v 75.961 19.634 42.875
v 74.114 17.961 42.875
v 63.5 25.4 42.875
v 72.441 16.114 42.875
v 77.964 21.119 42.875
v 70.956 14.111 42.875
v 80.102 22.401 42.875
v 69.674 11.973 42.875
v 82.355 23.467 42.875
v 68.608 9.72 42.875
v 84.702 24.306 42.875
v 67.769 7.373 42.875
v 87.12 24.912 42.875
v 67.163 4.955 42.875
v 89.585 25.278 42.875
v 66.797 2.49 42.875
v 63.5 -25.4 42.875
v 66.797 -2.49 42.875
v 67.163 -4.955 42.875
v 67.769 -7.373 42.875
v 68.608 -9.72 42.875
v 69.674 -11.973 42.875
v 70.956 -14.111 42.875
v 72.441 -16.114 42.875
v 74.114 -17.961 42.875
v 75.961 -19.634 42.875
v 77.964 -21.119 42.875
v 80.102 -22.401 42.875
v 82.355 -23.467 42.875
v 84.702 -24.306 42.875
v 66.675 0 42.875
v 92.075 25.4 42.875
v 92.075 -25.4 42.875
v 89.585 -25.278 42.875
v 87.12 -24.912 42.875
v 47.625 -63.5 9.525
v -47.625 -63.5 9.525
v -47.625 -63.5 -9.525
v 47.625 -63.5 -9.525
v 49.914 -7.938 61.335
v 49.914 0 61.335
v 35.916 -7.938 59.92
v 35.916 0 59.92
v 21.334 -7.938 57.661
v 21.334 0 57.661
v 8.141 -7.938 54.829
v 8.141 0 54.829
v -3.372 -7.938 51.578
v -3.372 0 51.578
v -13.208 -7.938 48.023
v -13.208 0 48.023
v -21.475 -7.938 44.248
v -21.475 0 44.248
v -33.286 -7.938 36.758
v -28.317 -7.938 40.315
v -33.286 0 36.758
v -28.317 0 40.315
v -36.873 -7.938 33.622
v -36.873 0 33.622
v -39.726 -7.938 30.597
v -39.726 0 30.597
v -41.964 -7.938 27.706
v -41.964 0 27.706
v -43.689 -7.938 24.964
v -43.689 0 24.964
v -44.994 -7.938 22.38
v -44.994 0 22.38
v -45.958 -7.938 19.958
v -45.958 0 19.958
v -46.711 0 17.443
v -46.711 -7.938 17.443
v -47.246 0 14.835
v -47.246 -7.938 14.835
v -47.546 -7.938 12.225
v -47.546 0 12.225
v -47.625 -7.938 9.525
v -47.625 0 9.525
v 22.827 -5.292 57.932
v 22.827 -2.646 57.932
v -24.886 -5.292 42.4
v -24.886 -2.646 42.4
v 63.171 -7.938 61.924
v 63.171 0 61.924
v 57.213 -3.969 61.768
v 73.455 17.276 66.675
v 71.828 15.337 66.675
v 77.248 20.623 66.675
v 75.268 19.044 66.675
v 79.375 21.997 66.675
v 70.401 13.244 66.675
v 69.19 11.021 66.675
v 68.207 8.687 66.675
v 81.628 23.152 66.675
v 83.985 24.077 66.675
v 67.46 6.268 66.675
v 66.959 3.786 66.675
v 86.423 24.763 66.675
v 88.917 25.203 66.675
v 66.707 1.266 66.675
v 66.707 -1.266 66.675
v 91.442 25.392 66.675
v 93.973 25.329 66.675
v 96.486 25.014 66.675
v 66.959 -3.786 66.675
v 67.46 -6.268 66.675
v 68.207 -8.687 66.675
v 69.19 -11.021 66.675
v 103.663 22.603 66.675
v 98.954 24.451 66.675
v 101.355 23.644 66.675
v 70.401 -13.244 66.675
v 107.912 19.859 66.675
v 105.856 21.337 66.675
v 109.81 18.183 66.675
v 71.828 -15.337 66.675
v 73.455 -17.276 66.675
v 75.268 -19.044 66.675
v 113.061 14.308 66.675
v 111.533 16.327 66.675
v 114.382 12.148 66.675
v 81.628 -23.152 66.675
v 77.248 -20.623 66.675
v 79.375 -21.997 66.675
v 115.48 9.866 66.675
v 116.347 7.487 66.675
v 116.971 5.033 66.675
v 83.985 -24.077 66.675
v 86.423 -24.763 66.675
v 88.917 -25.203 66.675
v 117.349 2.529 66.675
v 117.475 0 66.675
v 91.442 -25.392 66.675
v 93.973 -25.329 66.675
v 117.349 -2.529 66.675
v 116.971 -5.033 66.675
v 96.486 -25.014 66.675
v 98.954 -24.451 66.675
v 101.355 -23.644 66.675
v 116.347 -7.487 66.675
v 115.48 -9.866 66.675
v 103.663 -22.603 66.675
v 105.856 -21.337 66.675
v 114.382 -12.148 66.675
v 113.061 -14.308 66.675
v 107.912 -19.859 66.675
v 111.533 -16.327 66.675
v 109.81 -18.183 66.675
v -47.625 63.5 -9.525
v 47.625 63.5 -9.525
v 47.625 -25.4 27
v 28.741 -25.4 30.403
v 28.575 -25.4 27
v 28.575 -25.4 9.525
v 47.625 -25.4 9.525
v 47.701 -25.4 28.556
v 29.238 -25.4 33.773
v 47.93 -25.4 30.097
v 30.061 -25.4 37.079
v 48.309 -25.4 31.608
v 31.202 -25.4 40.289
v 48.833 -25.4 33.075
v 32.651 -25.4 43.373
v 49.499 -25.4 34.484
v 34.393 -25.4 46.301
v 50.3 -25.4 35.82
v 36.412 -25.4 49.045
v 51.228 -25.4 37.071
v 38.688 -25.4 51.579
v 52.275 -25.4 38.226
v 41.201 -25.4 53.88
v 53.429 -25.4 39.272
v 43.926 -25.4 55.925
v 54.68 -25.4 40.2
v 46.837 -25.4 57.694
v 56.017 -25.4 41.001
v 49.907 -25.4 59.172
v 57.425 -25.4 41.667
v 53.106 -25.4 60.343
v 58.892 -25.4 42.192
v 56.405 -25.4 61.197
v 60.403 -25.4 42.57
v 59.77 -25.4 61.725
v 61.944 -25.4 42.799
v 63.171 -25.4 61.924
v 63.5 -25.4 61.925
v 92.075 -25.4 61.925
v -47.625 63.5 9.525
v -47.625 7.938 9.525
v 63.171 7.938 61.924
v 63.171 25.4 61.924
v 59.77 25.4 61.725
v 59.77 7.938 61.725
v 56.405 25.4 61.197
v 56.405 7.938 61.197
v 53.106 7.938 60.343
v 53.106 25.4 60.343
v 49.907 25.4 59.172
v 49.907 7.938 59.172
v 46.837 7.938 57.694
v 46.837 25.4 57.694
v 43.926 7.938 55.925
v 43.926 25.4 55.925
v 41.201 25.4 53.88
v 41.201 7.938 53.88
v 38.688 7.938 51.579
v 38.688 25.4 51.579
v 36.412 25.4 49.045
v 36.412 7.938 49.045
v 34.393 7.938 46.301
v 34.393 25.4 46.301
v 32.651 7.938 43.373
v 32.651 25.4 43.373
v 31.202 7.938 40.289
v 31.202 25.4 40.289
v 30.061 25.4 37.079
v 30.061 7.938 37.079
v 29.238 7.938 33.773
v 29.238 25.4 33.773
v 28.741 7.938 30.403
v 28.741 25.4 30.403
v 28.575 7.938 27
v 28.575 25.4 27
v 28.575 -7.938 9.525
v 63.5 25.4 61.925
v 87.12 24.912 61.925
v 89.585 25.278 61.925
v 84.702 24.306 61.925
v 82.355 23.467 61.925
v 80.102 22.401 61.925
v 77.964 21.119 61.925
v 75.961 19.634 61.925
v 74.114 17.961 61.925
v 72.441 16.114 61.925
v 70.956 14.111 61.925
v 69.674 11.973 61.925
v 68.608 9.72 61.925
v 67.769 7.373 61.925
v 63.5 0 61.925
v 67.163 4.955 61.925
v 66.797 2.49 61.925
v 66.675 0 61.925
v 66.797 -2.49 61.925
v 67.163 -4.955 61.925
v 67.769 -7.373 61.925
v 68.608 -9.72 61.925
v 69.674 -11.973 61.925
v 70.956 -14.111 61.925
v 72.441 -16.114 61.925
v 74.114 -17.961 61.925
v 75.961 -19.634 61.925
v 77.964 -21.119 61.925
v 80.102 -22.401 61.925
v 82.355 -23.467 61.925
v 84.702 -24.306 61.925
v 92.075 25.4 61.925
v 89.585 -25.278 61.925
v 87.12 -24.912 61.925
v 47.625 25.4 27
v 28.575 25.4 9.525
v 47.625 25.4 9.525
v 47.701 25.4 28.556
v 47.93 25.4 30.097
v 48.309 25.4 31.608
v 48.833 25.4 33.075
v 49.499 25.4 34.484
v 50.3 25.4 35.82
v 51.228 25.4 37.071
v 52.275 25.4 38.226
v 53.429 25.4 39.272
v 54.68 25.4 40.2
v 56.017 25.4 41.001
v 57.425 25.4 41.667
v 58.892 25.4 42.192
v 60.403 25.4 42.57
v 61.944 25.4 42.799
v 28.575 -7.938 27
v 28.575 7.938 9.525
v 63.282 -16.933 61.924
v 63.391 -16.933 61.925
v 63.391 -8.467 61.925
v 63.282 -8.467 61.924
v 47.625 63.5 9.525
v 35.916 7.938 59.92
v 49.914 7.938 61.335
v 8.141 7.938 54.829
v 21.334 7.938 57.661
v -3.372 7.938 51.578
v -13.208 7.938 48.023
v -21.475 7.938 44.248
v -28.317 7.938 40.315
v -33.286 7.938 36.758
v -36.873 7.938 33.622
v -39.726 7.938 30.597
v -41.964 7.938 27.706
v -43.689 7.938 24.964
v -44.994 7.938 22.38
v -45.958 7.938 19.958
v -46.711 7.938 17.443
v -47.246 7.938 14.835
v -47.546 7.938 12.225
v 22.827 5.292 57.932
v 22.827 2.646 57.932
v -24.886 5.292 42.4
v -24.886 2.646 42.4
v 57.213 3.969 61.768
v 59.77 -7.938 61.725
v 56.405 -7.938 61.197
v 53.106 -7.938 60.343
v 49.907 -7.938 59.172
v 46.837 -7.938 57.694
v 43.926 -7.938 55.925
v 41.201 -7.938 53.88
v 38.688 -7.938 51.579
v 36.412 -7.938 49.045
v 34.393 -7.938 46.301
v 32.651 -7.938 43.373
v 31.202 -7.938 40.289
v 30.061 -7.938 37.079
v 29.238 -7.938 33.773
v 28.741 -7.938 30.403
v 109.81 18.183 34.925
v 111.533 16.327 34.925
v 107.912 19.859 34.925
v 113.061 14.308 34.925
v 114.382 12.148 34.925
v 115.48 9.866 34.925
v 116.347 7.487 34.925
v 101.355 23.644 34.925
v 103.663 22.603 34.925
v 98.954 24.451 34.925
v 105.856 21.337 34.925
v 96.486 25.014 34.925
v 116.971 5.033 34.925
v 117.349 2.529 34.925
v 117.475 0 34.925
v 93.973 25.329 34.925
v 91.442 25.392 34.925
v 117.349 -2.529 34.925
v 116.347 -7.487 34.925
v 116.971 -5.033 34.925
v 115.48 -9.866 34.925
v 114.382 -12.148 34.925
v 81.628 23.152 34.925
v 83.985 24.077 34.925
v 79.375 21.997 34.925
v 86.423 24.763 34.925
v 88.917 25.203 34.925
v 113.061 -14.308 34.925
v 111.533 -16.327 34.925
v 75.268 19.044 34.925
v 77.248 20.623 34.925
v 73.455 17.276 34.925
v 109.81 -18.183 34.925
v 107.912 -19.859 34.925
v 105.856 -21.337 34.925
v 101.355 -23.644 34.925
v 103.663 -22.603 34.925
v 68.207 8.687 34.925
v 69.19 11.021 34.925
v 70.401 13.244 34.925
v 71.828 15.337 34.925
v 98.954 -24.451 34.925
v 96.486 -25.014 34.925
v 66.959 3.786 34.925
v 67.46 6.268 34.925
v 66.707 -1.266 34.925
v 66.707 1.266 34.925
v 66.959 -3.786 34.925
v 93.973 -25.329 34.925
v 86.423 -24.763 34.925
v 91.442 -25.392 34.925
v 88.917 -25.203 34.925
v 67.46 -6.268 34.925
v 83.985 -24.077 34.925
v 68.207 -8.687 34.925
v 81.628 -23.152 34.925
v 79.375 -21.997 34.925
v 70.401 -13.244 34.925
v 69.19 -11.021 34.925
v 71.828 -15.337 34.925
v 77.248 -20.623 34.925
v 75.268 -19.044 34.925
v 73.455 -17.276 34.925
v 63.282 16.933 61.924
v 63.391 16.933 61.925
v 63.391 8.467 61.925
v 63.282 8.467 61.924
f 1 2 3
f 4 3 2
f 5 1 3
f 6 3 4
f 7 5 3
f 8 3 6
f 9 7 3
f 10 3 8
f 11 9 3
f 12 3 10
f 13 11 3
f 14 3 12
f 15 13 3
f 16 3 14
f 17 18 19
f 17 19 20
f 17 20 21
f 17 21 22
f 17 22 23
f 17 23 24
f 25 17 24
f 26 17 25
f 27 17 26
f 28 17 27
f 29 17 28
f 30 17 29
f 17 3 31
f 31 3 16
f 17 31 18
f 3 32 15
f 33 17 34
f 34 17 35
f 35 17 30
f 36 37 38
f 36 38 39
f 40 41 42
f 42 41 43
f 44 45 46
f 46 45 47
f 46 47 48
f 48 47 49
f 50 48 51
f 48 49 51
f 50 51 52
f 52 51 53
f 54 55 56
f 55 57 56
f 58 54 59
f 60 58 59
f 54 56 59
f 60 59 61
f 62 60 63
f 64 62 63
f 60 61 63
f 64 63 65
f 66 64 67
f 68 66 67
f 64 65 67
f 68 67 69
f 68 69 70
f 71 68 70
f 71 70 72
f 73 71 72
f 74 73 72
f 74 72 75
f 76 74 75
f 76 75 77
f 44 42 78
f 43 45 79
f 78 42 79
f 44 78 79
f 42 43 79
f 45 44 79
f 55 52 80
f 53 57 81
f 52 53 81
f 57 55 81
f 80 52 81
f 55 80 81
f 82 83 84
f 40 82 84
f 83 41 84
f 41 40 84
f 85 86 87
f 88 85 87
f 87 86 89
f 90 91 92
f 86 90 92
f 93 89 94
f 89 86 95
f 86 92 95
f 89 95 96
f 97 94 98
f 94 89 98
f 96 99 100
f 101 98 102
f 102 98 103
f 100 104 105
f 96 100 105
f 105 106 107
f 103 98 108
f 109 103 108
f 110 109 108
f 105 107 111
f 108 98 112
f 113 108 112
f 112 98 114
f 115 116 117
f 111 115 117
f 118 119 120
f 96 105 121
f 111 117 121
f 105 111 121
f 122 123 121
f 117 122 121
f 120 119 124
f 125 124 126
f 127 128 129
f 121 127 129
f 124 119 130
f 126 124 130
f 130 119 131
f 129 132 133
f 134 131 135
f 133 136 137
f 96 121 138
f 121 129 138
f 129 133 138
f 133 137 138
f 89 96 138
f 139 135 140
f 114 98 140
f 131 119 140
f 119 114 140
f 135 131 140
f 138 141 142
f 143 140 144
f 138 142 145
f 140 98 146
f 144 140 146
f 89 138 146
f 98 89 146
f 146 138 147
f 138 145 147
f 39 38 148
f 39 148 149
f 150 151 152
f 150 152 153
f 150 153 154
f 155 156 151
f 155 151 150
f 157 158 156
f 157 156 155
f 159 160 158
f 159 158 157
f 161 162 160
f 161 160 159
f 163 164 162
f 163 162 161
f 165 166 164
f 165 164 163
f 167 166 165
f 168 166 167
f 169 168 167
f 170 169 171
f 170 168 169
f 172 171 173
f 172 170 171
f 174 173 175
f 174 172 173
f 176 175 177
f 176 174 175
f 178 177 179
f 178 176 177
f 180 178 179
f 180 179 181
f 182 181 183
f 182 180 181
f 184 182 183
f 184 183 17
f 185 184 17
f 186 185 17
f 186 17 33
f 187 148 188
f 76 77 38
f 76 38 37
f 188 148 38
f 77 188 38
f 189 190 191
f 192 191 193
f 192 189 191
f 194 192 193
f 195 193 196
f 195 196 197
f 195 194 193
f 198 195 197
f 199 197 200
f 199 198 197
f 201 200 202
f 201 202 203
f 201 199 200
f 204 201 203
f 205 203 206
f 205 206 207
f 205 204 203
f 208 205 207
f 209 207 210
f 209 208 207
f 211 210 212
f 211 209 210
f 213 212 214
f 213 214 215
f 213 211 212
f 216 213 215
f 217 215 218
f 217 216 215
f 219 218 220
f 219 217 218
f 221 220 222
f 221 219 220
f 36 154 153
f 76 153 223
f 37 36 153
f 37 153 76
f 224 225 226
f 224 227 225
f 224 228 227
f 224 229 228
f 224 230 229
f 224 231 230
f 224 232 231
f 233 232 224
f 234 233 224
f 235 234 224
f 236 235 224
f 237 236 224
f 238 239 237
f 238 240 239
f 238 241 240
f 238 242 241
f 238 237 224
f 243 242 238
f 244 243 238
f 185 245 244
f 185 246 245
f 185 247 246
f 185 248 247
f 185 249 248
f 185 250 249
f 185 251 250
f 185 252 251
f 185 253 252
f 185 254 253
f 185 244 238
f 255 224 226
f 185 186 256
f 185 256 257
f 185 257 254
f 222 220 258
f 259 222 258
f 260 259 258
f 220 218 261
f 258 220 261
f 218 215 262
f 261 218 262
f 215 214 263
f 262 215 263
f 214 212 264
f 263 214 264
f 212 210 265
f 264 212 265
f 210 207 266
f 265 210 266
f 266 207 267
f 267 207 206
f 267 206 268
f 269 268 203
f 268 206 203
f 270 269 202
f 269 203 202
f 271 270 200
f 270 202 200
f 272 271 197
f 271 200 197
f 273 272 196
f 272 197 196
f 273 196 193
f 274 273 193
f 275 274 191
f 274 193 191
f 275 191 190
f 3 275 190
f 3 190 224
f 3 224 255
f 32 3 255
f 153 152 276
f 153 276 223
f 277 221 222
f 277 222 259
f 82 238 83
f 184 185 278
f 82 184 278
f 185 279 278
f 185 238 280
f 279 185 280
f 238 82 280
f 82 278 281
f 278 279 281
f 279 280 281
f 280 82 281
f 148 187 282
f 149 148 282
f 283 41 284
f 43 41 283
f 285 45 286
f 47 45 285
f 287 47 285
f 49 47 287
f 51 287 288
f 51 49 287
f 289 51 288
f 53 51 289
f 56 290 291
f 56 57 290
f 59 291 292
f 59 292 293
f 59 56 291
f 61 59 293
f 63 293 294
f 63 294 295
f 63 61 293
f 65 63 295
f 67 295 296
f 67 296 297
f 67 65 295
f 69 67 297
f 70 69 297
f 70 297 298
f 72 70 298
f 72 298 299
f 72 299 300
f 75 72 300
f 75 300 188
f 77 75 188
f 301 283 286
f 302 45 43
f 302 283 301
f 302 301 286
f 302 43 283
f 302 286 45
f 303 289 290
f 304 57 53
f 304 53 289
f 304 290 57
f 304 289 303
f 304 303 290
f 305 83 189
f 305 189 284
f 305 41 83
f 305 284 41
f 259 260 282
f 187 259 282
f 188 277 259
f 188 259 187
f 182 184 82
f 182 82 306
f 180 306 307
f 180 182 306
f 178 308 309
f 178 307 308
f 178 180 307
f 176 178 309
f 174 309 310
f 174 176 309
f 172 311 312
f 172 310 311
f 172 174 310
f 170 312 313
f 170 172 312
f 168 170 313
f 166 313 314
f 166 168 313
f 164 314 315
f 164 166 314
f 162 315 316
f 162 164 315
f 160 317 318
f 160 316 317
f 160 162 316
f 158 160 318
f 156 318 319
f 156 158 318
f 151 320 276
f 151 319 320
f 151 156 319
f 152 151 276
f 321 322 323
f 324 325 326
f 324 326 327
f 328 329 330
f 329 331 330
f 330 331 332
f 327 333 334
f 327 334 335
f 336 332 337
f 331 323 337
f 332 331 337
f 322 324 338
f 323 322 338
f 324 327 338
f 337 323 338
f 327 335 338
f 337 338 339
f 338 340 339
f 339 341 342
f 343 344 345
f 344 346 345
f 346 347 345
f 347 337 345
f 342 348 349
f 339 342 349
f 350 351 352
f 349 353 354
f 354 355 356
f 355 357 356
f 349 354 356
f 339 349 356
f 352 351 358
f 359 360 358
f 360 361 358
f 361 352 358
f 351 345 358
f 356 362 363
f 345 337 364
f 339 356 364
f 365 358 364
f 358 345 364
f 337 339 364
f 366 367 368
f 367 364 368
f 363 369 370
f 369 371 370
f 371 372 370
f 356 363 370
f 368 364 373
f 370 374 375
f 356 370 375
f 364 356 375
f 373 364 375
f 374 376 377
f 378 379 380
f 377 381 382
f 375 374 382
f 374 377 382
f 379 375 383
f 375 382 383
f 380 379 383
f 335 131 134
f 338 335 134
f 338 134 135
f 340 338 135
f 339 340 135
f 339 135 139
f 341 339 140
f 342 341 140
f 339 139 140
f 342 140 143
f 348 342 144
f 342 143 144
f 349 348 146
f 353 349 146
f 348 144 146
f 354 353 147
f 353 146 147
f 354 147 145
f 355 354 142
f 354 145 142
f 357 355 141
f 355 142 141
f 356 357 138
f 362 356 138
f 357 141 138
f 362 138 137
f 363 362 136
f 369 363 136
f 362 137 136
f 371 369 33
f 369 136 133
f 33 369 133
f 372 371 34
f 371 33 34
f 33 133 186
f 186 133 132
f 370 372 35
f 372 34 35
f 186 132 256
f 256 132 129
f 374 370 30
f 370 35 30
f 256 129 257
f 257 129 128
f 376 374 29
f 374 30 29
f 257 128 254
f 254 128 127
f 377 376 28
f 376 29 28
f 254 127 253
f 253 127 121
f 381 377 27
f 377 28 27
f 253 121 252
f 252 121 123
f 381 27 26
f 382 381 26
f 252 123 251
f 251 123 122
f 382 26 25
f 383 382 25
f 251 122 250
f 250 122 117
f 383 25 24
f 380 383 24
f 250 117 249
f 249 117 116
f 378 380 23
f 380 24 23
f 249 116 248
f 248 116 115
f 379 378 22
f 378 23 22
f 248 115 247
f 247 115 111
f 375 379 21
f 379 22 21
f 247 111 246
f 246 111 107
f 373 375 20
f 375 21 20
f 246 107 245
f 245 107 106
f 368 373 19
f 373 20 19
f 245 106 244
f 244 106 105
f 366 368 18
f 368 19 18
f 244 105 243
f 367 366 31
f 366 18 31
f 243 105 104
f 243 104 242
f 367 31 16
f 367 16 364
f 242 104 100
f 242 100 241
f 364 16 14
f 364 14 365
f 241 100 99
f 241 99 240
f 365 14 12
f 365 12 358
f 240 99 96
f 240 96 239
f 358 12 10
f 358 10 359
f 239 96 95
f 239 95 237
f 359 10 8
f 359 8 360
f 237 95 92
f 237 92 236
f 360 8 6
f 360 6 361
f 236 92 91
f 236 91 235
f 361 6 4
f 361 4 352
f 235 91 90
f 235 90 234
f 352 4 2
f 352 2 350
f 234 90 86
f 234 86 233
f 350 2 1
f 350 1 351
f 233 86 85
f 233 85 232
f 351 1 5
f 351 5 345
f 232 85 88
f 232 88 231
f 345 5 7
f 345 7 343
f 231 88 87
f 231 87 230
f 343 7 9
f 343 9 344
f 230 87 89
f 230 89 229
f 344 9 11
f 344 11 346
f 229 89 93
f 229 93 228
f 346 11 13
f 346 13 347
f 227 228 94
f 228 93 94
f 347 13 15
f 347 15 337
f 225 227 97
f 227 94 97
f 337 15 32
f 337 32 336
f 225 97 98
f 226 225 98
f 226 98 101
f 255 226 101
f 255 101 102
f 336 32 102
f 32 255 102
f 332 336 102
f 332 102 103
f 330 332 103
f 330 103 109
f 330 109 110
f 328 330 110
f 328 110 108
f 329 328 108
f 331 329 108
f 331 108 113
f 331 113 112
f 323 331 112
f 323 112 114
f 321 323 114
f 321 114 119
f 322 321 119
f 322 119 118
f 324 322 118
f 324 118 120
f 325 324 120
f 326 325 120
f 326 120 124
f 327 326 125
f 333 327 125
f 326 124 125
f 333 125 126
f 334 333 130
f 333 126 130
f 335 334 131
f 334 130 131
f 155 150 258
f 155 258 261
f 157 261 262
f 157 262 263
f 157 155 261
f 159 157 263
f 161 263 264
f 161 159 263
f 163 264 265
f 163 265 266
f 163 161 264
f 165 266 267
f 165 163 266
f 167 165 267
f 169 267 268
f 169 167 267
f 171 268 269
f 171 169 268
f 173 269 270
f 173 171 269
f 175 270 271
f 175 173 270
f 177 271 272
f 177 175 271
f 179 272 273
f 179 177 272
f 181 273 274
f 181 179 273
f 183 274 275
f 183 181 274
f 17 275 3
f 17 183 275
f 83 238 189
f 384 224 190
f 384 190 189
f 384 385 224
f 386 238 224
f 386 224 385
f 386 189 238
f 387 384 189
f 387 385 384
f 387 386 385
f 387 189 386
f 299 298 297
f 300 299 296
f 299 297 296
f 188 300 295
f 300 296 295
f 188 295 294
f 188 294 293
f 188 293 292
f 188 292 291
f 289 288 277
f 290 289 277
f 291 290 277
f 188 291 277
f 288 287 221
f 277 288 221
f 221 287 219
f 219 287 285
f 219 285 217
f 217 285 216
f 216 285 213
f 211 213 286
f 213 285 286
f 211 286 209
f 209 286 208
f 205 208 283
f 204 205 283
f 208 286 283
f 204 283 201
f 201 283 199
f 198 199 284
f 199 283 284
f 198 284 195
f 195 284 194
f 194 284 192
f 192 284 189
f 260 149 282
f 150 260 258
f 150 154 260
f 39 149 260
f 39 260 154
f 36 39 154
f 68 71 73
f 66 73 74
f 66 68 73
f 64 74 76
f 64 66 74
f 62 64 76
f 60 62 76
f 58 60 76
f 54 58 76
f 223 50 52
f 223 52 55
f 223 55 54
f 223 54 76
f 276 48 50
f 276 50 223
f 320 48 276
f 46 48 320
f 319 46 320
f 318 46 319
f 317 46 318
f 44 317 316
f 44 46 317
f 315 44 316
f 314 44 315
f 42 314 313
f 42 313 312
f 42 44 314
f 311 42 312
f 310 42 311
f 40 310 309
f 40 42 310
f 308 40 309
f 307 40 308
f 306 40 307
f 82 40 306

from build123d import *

# Parameters (mm, degrees)
F0_W     = 47.625
F0_H     = 19.05
F1_DEPTH = 63.5
F0_W_2   = 25.4
F2_DEPTH = 25.4
F3_DEPTH = 7.9375


# Not quite as in the source:
# - a feature of the source that left no trace in its solid (it failed there, or was rolled back) is left out


with BuildPart() as f1:
    # F0 (on Front) → F1 (new body, symmetric)
    with BuildSketch(Plane.XZ):
        with Locations((-23.8125, 0)):
            Rectangle(F0_W, F0_H)
        Polygon((28.575, 9.525), (0, 9.525), (0, -9.525), (47.625, -9.525), (47.625, 9.525), align=None)
    extrude(amount=F1_DEPTH, both=True)

    # F0 (on Front) → F2 (join, symmetric)
    with BuildSketch(Plane.XZ):
        with BuildLine():
            add(Edge.make_bspline(
                [(63.5, 61.9252), (63.391502904, 61.9248401337), (63.2819047305, 61.9243249441), (63.1712168671, 61.9236523874)],
                knots=[0, 0, 0, 0, 0.5232436579, 0.5232436579, 0.5232436579, 0.5232436579], degree=3))
            ThreePointArc((63.1712168671, 61.9236523874), (38.6883255712, 51.5793870704), (28.575, 27.0002))
            Line((28.575, 27.0002), (28.575, 9.525))
            Line((28.575, 9.525), (47.625, 9.525))
            Line((47.625, 9.525), (47.625, 27.0002))
            ThreePointArc((47.625, 27.0002), (52.2746798487, 38.2255201513), (63.5, 42.8752))
            Line((63.5, 42.8752), (66.675, 42.8752))
            Line((66.675, 42.8752), (66.675, 61.9252))
            Line((66.675, 61.9252), (63.5, 61.9252))
        make_face()
        with Locations((79.375, 52.4002)):
            Rectangle(F0_W_2, F0_H)
    extrude(amount=F2_DEPTH, both=True)

    # F0 (on Front) → F3 (join, symmetric)
    with BuildSketch(Plane.XZ):
        with BuildLine():
            add(Edge.make_bspline(
                [(63.1712168671, 61.9236523874), (37.2919174266, 61.7664057285), (-48.1546851166, 53.0067745419), (-47.625, 9.525)],
                knots=[0.5232436579, 0.5232436579, 0.5232436579, 0.5232436579, 122.8598656398, 122.8598656398, 122.8598656398, 122.8598656398], degree=3))
            Line((-47.625, 9.525), (0, 9.525))
            Line((0, 9.525), (28.575, 9.525))
            Line((28.575, 9.525), (28.575, 27.0002))
            ThreePointArc((28.575, 27.0002), (38.6883255712, 51.5793870704), (63.1712168671, 61.9236523874))
        make_face()
    extrude(amount=F3_DEPTH, both=True)

    # F0 (on Front) → F4 (revolve)
    with BuildSketch(Plane.XZ):
        Polygon((92.075, 66.675), (92.075, 61.9252), (92.075, 42.8752), (92.075, 34.925), (117.475, 34.925), (117.475, 66.675), align=None)
    revolve(axis=Axis((92.075, 0, 50.8), (0, 0, -1)))


solid = f1.part
